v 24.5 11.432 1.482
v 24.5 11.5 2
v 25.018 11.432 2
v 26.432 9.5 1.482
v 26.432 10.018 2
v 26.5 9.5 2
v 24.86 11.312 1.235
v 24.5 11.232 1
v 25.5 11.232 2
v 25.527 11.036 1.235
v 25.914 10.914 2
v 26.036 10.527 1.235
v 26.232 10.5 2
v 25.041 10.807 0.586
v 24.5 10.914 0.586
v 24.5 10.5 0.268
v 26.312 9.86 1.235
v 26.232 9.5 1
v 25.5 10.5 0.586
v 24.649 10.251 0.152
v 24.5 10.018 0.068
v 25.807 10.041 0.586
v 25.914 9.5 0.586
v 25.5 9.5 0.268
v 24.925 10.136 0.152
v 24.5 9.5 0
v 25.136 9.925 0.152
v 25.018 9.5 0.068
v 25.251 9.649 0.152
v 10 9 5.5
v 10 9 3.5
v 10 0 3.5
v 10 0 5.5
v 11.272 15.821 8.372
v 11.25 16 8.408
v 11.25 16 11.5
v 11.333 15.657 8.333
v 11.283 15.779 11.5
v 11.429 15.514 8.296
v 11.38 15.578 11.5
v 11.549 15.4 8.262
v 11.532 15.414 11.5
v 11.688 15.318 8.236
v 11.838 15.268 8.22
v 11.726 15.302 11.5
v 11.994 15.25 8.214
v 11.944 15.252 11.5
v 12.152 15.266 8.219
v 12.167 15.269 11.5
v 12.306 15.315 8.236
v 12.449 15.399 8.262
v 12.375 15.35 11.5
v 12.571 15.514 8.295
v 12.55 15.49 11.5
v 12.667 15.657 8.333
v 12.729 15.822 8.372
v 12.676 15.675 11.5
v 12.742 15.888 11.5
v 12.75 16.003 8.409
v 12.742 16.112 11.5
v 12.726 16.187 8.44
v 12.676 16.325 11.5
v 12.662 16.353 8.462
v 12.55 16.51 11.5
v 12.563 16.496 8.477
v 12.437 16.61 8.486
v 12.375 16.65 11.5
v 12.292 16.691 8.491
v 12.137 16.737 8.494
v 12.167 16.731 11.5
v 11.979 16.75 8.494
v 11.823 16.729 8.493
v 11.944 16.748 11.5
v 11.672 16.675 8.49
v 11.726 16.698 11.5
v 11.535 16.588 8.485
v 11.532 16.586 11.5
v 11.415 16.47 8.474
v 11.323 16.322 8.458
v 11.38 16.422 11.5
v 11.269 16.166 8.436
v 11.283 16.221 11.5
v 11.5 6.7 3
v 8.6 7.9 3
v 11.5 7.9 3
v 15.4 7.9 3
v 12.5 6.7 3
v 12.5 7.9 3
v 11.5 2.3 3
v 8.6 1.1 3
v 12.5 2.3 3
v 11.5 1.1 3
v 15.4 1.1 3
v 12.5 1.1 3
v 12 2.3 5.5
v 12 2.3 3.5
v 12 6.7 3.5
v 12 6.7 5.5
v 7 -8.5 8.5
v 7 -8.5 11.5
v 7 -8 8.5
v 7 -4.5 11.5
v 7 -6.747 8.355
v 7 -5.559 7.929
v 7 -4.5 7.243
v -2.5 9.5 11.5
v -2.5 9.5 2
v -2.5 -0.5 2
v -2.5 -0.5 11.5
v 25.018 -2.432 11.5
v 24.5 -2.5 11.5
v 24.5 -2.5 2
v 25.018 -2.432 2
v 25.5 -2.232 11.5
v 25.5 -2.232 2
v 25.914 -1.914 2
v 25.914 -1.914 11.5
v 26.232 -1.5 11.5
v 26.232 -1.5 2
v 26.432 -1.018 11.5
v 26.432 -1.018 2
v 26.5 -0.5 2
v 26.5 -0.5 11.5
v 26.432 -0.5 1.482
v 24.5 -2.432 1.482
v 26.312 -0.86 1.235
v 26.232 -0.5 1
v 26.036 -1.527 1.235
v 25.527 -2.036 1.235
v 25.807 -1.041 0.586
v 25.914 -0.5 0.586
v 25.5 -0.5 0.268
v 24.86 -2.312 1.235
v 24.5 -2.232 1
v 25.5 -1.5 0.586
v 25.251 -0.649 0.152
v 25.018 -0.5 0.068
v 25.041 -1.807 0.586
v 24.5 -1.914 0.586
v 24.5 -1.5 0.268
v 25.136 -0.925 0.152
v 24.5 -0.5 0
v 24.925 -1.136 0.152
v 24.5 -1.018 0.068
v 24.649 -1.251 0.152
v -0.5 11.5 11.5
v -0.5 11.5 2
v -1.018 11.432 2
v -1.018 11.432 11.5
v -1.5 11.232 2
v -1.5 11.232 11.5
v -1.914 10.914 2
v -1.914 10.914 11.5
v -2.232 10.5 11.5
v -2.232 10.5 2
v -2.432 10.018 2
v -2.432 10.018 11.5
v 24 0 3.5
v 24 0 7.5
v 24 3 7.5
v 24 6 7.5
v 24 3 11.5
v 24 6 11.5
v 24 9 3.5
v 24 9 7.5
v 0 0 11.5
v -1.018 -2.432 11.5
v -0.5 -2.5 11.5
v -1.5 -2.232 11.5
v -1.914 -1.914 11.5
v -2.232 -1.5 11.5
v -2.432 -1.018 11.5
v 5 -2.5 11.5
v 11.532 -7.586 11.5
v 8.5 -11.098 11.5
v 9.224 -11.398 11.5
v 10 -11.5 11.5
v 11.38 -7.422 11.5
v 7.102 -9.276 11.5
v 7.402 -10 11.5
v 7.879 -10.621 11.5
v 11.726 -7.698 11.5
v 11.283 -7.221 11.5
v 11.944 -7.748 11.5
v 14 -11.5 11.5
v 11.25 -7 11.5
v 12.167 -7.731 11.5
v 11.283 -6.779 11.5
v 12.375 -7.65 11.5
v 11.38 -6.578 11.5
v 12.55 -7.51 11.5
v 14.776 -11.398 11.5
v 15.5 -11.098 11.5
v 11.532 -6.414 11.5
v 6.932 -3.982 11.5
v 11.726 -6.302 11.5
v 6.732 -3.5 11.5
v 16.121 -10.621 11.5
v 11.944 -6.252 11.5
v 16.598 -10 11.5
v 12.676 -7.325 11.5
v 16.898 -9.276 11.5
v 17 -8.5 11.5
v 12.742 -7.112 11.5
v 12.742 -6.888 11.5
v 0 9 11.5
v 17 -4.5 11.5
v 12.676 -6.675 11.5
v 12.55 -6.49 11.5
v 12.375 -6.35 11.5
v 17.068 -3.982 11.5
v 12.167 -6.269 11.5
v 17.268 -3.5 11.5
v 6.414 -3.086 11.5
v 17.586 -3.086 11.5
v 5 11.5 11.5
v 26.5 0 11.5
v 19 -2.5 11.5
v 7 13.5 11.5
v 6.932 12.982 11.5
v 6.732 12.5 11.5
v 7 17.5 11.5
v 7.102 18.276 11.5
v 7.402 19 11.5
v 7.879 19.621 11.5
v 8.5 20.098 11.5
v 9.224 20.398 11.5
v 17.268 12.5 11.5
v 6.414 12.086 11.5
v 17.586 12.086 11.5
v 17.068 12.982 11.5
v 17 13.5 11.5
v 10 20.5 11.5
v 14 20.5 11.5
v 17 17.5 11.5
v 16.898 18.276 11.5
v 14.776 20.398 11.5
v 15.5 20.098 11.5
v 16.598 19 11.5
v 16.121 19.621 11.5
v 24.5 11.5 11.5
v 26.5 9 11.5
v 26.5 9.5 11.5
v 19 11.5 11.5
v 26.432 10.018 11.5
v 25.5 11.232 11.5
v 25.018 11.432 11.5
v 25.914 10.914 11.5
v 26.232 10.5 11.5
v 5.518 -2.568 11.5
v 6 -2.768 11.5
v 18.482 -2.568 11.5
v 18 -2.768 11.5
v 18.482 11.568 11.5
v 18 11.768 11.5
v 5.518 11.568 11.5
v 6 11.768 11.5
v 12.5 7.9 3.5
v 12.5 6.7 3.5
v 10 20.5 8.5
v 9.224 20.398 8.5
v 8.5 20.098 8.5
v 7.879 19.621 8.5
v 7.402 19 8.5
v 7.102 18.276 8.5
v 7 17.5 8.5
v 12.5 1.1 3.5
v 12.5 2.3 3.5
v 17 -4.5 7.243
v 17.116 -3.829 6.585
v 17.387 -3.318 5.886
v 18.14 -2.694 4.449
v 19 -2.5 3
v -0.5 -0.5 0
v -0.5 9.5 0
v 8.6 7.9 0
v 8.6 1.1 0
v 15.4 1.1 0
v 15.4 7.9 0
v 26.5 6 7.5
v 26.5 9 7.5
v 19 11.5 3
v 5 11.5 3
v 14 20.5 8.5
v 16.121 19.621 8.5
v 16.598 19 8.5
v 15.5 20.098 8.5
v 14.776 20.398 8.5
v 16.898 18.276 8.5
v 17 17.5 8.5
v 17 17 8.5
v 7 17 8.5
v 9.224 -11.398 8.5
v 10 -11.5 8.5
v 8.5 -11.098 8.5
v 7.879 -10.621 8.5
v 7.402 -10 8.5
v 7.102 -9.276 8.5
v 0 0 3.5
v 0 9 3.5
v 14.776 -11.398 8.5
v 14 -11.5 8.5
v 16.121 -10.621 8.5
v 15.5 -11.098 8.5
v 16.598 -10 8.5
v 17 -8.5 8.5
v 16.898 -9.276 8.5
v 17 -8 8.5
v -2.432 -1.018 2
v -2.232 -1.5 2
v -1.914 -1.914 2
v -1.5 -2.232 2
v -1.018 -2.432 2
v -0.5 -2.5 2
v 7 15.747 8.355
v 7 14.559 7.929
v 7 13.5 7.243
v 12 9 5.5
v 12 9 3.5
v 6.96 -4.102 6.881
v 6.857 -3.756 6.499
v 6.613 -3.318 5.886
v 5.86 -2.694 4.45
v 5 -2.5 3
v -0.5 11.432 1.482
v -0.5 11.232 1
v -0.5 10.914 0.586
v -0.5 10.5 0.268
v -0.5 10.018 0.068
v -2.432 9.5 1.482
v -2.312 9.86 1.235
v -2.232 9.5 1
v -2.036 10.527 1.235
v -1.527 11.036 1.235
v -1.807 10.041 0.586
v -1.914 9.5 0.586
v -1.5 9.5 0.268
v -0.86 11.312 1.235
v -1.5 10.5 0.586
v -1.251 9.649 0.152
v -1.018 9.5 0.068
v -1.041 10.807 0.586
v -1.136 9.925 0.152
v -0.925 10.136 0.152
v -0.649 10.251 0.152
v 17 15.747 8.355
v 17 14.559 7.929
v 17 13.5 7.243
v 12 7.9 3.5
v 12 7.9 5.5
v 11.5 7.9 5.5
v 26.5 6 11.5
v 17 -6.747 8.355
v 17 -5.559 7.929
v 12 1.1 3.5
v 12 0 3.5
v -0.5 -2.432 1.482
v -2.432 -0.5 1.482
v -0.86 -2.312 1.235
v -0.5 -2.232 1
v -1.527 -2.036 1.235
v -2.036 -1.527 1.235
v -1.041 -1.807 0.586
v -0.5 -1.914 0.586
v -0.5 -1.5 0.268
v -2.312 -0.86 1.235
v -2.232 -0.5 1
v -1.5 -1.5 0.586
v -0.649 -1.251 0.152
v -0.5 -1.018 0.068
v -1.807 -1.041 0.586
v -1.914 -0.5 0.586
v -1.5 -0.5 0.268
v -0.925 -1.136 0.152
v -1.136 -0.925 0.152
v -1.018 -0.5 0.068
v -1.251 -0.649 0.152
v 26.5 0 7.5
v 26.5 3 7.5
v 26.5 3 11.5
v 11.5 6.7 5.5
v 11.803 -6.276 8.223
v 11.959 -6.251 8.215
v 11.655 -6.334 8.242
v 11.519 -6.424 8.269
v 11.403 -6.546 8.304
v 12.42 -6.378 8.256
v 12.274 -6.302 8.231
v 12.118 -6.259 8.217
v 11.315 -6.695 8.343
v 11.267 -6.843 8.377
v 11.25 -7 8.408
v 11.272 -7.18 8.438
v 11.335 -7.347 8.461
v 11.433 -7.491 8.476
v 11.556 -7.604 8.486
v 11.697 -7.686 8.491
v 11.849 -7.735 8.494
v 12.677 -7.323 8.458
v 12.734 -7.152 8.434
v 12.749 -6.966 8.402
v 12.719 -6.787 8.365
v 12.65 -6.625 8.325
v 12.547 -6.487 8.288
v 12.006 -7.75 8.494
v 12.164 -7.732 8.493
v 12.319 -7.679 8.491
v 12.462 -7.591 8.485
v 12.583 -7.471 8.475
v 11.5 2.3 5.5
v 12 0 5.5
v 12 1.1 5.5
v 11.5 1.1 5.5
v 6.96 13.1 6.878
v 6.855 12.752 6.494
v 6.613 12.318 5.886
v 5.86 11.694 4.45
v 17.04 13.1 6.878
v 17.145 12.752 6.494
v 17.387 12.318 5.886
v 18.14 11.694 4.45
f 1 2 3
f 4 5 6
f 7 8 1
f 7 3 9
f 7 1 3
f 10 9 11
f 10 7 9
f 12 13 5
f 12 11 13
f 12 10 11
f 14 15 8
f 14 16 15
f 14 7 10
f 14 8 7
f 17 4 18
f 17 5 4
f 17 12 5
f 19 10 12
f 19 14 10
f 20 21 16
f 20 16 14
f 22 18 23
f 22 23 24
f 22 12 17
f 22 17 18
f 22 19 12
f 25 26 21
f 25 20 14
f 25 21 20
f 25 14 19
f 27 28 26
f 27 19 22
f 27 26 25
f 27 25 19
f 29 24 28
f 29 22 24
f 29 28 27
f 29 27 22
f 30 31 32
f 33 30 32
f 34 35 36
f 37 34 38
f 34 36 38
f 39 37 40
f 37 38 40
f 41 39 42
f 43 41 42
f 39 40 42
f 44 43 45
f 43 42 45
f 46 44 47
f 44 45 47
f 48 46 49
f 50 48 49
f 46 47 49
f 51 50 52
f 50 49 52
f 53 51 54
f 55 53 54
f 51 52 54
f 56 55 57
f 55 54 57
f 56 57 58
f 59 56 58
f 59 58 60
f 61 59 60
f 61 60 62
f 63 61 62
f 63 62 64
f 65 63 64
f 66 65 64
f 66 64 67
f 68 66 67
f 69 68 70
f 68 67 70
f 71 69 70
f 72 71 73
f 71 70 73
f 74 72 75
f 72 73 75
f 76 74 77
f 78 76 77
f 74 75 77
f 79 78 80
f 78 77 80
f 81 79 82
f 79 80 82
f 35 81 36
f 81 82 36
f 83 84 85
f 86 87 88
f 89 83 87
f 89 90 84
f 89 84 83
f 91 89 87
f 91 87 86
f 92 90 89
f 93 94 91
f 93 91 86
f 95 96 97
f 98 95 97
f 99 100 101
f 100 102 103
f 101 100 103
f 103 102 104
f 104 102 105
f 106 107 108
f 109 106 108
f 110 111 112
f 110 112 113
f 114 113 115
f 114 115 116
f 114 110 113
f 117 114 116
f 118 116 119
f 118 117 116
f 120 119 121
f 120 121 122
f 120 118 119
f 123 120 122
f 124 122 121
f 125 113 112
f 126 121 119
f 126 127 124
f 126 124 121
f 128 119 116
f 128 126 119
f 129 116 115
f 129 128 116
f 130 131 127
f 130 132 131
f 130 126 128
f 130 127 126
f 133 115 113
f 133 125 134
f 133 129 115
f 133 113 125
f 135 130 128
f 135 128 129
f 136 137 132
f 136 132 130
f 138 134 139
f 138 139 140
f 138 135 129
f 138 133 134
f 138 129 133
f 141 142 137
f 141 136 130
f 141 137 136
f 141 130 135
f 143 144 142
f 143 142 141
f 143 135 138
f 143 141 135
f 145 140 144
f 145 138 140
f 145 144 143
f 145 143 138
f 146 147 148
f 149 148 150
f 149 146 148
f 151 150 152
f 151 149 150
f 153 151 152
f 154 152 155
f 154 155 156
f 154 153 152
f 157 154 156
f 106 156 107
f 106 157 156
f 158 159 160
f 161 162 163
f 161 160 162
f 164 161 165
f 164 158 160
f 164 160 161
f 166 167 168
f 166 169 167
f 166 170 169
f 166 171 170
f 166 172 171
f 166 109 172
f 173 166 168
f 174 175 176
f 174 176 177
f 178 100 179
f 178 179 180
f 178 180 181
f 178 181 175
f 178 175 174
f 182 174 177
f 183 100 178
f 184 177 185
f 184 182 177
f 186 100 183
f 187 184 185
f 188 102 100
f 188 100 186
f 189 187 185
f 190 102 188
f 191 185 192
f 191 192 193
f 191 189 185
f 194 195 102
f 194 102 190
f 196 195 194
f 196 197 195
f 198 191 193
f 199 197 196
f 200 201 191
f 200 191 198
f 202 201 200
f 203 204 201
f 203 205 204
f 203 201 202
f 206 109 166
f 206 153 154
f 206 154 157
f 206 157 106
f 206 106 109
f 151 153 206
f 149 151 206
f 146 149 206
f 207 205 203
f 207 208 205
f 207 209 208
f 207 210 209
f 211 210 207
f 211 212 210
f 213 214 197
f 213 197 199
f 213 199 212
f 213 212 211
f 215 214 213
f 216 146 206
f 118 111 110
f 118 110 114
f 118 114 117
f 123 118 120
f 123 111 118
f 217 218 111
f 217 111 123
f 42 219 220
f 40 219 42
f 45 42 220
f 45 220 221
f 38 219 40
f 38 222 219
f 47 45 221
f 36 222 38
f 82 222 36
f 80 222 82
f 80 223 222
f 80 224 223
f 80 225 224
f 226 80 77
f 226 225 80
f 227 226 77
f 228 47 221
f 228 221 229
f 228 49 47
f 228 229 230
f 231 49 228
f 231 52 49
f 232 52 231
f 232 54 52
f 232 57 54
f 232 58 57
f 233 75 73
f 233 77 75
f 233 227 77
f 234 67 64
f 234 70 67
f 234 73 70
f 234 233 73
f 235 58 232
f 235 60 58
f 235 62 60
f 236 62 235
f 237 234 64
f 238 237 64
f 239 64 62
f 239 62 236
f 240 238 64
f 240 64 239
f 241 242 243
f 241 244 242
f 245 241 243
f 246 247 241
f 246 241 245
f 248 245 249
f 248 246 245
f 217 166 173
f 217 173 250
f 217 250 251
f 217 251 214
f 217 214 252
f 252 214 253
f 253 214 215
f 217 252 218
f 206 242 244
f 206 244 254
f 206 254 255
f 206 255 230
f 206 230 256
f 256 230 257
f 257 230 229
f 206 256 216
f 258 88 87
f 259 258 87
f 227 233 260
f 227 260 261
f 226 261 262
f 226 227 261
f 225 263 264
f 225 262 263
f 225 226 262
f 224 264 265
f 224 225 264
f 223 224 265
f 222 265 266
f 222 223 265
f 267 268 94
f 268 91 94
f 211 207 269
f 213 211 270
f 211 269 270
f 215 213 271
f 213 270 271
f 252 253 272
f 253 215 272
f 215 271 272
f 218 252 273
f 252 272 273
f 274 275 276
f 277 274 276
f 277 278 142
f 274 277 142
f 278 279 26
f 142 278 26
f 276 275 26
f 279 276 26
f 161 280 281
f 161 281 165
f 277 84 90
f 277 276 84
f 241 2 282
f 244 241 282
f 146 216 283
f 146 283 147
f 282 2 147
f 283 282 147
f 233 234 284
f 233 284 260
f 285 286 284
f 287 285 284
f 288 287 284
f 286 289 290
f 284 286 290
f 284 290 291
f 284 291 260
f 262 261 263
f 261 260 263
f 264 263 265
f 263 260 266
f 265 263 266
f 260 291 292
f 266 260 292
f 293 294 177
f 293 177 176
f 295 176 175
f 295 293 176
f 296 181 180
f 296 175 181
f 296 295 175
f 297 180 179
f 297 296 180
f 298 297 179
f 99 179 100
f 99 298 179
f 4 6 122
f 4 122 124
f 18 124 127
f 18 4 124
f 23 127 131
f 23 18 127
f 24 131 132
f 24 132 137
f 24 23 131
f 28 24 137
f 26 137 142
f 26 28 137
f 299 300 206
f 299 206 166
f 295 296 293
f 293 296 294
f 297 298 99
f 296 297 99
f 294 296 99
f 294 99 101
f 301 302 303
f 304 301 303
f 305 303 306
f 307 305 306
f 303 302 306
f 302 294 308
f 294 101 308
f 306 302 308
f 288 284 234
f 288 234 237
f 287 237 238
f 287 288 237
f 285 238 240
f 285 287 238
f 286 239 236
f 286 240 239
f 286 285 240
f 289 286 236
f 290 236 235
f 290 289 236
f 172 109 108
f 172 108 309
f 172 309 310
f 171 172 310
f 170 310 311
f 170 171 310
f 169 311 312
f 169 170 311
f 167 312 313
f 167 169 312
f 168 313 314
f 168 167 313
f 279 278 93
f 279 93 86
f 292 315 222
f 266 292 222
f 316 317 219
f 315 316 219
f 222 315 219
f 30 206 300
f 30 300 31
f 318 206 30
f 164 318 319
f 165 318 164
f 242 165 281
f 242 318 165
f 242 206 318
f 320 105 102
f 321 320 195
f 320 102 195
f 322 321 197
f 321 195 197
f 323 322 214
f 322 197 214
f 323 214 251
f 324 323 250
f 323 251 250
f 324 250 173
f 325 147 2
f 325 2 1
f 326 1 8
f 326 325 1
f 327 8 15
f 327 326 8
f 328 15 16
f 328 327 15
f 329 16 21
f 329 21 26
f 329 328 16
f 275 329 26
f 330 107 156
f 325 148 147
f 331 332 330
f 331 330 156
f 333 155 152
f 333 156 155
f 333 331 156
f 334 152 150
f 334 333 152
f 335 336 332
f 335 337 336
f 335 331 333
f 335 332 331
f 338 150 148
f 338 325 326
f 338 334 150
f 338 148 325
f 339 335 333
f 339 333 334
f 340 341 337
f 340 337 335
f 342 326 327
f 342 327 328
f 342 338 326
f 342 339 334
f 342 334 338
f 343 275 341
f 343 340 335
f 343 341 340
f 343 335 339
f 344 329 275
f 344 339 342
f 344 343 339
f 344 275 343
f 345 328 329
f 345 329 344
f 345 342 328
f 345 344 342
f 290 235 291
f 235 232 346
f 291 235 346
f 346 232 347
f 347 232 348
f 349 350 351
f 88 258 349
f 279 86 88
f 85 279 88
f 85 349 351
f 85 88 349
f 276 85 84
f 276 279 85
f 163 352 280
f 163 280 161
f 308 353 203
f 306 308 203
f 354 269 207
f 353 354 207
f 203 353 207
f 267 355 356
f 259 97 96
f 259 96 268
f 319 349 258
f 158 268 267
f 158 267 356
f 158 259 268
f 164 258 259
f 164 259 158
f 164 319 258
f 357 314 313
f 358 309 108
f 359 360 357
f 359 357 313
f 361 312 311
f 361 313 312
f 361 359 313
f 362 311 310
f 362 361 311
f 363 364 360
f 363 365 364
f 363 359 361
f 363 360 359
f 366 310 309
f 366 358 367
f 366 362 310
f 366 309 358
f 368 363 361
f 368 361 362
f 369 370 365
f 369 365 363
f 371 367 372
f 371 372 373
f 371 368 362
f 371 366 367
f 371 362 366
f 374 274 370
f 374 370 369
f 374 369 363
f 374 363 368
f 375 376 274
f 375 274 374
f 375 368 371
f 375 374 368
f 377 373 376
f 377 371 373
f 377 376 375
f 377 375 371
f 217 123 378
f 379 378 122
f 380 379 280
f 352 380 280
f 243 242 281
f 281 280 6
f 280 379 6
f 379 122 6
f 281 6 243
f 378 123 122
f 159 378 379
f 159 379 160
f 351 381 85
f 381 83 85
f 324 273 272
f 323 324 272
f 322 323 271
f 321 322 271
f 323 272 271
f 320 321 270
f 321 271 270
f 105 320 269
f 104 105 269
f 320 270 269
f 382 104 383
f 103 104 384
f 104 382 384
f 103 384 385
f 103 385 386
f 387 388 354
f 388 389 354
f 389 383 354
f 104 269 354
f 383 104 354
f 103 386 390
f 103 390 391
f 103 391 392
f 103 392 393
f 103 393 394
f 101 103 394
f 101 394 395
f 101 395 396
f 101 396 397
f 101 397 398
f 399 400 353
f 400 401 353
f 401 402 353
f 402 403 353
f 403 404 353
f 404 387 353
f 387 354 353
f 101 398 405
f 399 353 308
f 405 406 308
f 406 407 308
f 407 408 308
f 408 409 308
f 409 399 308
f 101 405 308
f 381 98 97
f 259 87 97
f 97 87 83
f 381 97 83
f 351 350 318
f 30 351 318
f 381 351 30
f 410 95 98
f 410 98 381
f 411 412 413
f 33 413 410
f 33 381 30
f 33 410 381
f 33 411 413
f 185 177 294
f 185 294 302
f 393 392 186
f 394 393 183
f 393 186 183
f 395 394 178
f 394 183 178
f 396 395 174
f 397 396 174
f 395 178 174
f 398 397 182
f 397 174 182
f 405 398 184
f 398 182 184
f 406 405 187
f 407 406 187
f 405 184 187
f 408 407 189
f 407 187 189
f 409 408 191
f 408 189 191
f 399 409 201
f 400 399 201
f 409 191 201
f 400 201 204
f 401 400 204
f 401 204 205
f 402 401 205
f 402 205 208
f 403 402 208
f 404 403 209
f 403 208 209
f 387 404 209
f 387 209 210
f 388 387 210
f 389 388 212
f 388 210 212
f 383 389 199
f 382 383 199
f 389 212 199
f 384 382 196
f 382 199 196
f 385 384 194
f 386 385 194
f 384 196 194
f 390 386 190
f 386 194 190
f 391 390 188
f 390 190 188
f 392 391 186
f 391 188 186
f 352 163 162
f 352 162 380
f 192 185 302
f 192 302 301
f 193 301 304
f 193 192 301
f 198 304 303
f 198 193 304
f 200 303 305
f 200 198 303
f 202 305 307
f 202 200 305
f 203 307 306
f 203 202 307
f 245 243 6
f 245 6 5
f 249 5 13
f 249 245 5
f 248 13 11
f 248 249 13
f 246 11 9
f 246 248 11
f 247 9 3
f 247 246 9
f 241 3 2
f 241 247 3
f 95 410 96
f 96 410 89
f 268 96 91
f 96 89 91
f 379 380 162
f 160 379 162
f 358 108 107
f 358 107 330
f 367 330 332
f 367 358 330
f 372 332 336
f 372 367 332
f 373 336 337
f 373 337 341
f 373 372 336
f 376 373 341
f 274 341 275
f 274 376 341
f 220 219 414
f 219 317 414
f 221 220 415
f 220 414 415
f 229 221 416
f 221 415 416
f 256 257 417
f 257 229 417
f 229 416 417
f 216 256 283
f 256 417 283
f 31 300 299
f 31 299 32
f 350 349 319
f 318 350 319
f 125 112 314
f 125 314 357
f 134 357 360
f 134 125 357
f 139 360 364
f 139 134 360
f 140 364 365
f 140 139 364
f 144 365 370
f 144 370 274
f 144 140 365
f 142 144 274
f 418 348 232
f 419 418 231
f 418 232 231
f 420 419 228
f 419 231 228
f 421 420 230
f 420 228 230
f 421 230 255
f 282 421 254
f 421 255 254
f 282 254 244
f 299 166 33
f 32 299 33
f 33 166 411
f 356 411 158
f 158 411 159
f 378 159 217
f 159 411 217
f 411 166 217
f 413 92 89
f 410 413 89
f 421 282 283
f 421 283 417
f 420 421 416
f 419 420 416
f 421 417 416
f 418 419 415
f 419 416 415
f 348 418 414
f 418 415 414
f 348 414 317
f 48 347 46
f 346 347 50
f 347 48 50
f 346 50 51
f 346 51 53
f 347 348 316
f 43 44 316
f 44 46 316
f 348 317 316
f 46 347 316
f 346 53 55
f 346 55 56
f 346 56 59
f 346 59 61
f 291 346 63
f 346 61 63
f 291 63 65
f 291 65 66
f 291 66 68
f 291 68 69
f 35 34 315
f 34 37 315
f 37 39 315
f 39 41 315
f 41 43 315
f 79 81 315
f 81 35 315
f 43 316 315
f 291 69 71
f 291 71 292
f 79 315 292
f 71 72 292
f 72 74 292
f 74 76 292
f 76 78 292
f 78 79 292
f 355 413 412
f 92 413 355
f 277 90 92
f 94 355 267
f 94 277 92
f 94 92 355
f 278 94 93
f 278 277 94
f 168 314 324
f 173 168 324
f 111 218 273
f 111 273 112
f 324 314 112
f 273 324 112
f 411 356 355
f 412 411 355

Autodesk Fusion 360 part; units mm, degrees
sketch "Sketch6" plane through (0, 0, 0) normal (0, 0, 1) x (1, 0, 0)
  line L0 (0, 0) -> (24, 0)
  line L1 (24, 0) -> (24, 9)
  line L2 (24, 9) -> (0, 9)
  line L3 (0, 9) -> (0, 0)
  line L4 (24, 9) -> (26.5, 9) construction
  line L5 (26.5, 9) -> (26.5, 11.5) construction
  line L6 (0, 0) -> (-2.5, 0) construction
  line L7 (-2.5, 0) -> (-2.5, -2.5) construction
  line L8 (26.5, 11.5) -> (-2.5, 11.5)
  line L9 (-2.5, 11.5) -> (-2.5, -2.5)
  line L10 (-2.5, -2.5) -> (26.5, -2.5)
  line L11 (26.5, -2.5) -> (26.5, 11.5)
  dimension "d28" = 24
  dimension "d29" = 9
  dimension "d32" = 2.5
  dimension "d33" = 2.5
  dimension "d34" = 2.5
  dimension "d35" = 2.5
extrude "Extrude8" add sketch "Sketch6" along normal blind 3.5 contours L0 L1 L2 L3
sketch "Sketch7" plane through (0, 0, 3.5) normal (0, 0, 1) x (-1, 0, 0)
  line L0 (0, -9) -> (0, 0)
  line L1 (0, 0) -> (-24, 0)
  line L2 (-24, 0) -> (-24, -9)
  line L3 (-24, -9) -> (0, -9)
  line L4 (-12, -9) -> (-10, -9)
  line L5 (-10, -9) -> (-10, 0)
  line L6 (-10, 0) -> (-12, 0)
  line L7 (-12, 0) -> (-12, -9)
extrude "Extrude9" add sketch "Sketch7" along normal blind 2 contours L1 L3 L4 L5 L6 L7
sketch "Sketch8" plane through (0, 0, 0) normal (0, 0, -1) x (1, 0, 0)
  line L0 (0, 0) -> (0, -9)
  line L1 (0, -9) -> (24, -9)
  line L2 (24, -9) -> (24, 0)
  line L3 (24, 0) -> (0, 0)
  line L4 (12, 0) -> (12, -9) construction
  line L5 (15.4, -7.9) -> (8.6, -7.9)
  line L6 (8.6, -7.9) -> (8.6, -1.1)
  line L7 (8.6, -1.1) -> (15.4, -1.1)
  line L8 (15.4, -1.1) -> (15.4, -7.9)
  line L9 (15.4, -7.9) -> (8.6, -1.1) construction
  line L10 (8.6, -7.9) -> (15.4, -1.1) construction
  point P0 (12, -4.5)
  dimension "d39" = 6.8
  dimension "d40" = 6.8
extrude "Extrude10" cut sketch "Sketch8" against normal blind 3 contours L5 L6 L7 L8
extrude "Extrude13" add sketch "Sketch6" along normal blind 11.5
sketch "Sketch10" plane through (0, 0, 11.5) normal (0, 0, 1) x (-1, 0, 0)
  line L0 (0, 0) -> (0, -9)
  line L1 (0, -9) -> (-24, -9)
  line L2 (-24, -9) -> (-24, 0)
  line L3 (-24, 0) -> (0, 0)
  line L4 (-26.5, 2.5) -> (-26.5, -11.5)
  line L5 (-26.5, -11.5) -> (2.5, -11.5)
  line L6 (2.5, -11.5) -> (2.5, 2.5)
  line L7 (2.5, 2.5) -> (-26.5, 2.5)
  line L8 (-24, 0) -> (-26.5, 0)
  line L9 (-26.5, 0) -> (-26.5, -3)
  line L10 (-26.5, -3) -> (-24, -3)
  line L11 (-24, -3) -> (-24, 0)
  line L12 (-24, -9) -> (-26.5, -9)
  line L13 (-26.5, -9) -> (-26.5, -6)
  line L14 (-26.5, -6) -> (-24, -6)
  line L15 (-24, -6) -> (-24, -9)
  dimension "d50" = 3
  dimension "d51" = 3
extrude "Extrude14" cut sketch "Sketch10" against normal blind 4 contours L2 L4 L8 L9 L10 L11 | L2 L4 L12 L13 L14 L15
sketch "Sketch11" plane through (0, 11.5, 0) normal (0, 1, 0) x (-1, 0, 0)
  line L0 (-26.5, 0) -> (2.5, 0)
  line L1 (2.5, 0) -> (2.5, 11.5)
  line L2 (2.5, 11.5) -> (-26.5, 11.5)
  line L3 (-26.5, 11.5) -> (-26.5, 0)
  line L4 (-12, 11.5) -> (-7, 11.5) construction
  line L5 (-7, 11.5) -> (-17, 11.5)
  line L6 (-17, 11.5) -> (-17, 8.5)
  line L7 (-17, 8.5) -> (-7, 8.5)
  line L8 (-7, 8.5) -> (-7, 11.5)
  dimension "d54" = 5
  dimension "d55" = 10
  dimension "d56" = 3
extrude "Extrude15" add sketch "Sketch11" along normal blind 9 contours L2 L5 L6 L7 L8
sketch "Sketch12" plane through (0, -2.5, 0) normal (0, -1, 0) x (1, 0, 0)
  line L0 (-2.5, 0) -> (26.5, 0)
  line L1 (26.5, 0) -> (26.5, 11.5)
  line L2 (26.5, 11.5) -> (-2.5, 11.5)
  line L3 (-2.5, 11.5) -> (-2.5, 0)
  line L4 (12, 11.5) -> (17, 11.5) construction
  line L5 (17, 11.5) -> (7, 11.5)
  line L6 (7, 11.5) -> (7, 8.5)
  line L7 (7, 8.5) -> (17, 8.5)
  line L8 (17, 8.5) -> (17, 11.5)
  dimension "d59" = 5
  dimension "d60" = 10
  dimension "d61" = 3
extrude "Extrude16" add sketch "Sketch12" along normal blind 9 contours L2 L5 L6 L7 L8
fillet "Fillet1" radius 5.5 2 edges at (12, -2.5, 8.5) (12, 11.5, 8.5)
fillet "Fillet2" radius 3 4 edges at (17, 20.5, 10) (7, 20.5, 10) (17, -11.5, 10) (7, -11.5, 10)
fillet "Fillet3" radius 2 4 edges at (-2.5, 11.5, 5.75) (-2.5, -2.5, 5.75) (26.5, 11.5, 5.75) (26.5, -2.5, 5.75)
fillet "Fillet4" radius 2 4 edges at (7, -2.5, 7.25) (17, -2.5, 7.25) (17, 11.5, 7.25) (7, 11.5, 7.25)
sketch "Sketch13" plane through (0, 0, 11.5) normal (0, 0, 1) x (-1, 0, 0)
  arc A0 (-24.5, 2.5) -> (-26.5, 0.5) centre (-24.5, 0.5) ccw
  line L0 (-26.5, 0.5) -> (-26.5, 0)
  line L1 (-26.5, 0) -> (0, 0)
  line L2 (0, 0) -> (0, -9)
  line L3 (0, -9) -> (-26.5, -9)
  line L4 (-26.5, -9) -> (-26.5, -9.5)
  arc A1 (-26.5, -9.5) -> (-24.5, -11.5) centre (-24.5, -9.5) ccw
  line L5 (-24.5, -11.5) -> (-19, -11.5)
  arc A2 (-17, -13.5) -> (-19, -11.5) centre (-19, -13.5) ccw
  line L6 (-17, -13.5) -> (-17, -17.5)
  arc A3 (-17, -17.5) -> (-14, -20.5) centre (-14, -17.5) ccw
  line L7 (-14, -20.5) -> (-10, -20.5)
  arc A4 (-10, -20.5) -> (-7, -17.5) centre (-10, -17.5) ccw
  line L8 (-7, -17.5) -> (-7, -13.5)
  arc A5 (-5, -11.5) -> (-7, -13.5) centre (-5, -13.5) ccw
  line L9 (-5, -11.5) -> (0.5, -11.5)
  arc A6 (0.5, -11.5) -> (2.5, -9.5) centre (0.5, -9.5) ccw
  line L10 (2.5, -9.5) -> (2.5, 0.5)
  arc A7 (2.5, 0.5) -> (0.5, 2.5) centre (0.5, 0.5) ccw
  line L11 (0.5, 2.5) -> (-5, 2.5)
  arc A8 (-7, 4.5) -> (-5, 2.5) centre (-5, 4.5) ccw
  line L12 (-7, 4.5) -> (-7, 8.5)
  arc A9 (-7, 8.5) -> (-10, 11.5) centre (-10, 8.5) ccw
  line L13 (-10, 11.5) -> (-14, 11.5)
  arc A10 (-14, 11.5) -> (-17, 8.5) centre (-14, 8.5) ccw
  line L14 (-17, 8.5) -> (-17, 4.5)
  arc A11 (-19, 2.5) -> (-17, 4.5) centre (-19, 4.5) ccw
  line L15 (-19, 2.5) -> (-24.5, 2.5)
  line L16 (-12, -20.5) -> (-12, -16) construction
  line L17 (-12, 11.5) -> (-12, 7) construction
  circle A12 centre (-12, -16) radius 0.75
  circle A13 centre (-12, 7) radius 0.75
  dimension "d72" = 4.5
  dimension "d73" = 1.5
  dimension "d74" = 1.5
extrude "Extrude17" cut sketch "Sketch13" against normal blind 5 contours A12 | A13
sketch "Sketch14" plane through (0, 0, 3) normal (0, 0, -1) x (1, 0, 0)
  line L0 (15.4, -1.1) -> (8.6, -1.1)
  line L1 (8.6, -1.1) -> (8.6, -7.9)
  line L2 (8.6, -7.9) -> (15.4, -7.9)
  line L3 (15.4, -7.9) -> (15.4, -1.1)
  line L4 (12, -1.1) -> (12.5, -1.1)
  line L5 (12.5, -1.1) -> (11.5, -1.1)
  line L6 (11.5, -1.1) -> (11.5, -2.3)
  line L7 (11.5, -2.3) -> (12.5, -2.3)
  line L8 (12.5, -2.3) -> (12.5, -1.1)
  line L9 (12, -7.9) -> (11.5, -7.9)
  line L10 (11.5, -7.9) -> (12.5, -7.9)
  line L11 (12.5, -7.9) -> (12.5, -6.7)
  line L12 (12.5, -6.7) -> (11.5, -6.7)
  line L13 (11.5, -6.7) -> (11.5, -7.9)
  dimension "d77" = 0.5
  dimension "d78" = 1
  dimension "d79" = 1.2
  dimension "d80" = 0.5
  dimension "d81" = 1
  dimension "d82" = 1.2
extrude "Extrude18" cut sketch "Sketch14" against normal up to surface (2.5 mm away) contours L0 L4 L5 L6 L7 L8 | L2 L9 L10 L11 L12 L13
fillet "Fillet5" radius 2 8 edges at (12, -2.5, 0) (25.9142, -1.9142, 0) (26.5, 4.5, 0) (25.9142, 10.9142, 0) (12, 11.5, 0) (-1.9142, 10.9142, 0) (-2.5, 4.5, 0) (-1.9142, -1.9142, 0)
